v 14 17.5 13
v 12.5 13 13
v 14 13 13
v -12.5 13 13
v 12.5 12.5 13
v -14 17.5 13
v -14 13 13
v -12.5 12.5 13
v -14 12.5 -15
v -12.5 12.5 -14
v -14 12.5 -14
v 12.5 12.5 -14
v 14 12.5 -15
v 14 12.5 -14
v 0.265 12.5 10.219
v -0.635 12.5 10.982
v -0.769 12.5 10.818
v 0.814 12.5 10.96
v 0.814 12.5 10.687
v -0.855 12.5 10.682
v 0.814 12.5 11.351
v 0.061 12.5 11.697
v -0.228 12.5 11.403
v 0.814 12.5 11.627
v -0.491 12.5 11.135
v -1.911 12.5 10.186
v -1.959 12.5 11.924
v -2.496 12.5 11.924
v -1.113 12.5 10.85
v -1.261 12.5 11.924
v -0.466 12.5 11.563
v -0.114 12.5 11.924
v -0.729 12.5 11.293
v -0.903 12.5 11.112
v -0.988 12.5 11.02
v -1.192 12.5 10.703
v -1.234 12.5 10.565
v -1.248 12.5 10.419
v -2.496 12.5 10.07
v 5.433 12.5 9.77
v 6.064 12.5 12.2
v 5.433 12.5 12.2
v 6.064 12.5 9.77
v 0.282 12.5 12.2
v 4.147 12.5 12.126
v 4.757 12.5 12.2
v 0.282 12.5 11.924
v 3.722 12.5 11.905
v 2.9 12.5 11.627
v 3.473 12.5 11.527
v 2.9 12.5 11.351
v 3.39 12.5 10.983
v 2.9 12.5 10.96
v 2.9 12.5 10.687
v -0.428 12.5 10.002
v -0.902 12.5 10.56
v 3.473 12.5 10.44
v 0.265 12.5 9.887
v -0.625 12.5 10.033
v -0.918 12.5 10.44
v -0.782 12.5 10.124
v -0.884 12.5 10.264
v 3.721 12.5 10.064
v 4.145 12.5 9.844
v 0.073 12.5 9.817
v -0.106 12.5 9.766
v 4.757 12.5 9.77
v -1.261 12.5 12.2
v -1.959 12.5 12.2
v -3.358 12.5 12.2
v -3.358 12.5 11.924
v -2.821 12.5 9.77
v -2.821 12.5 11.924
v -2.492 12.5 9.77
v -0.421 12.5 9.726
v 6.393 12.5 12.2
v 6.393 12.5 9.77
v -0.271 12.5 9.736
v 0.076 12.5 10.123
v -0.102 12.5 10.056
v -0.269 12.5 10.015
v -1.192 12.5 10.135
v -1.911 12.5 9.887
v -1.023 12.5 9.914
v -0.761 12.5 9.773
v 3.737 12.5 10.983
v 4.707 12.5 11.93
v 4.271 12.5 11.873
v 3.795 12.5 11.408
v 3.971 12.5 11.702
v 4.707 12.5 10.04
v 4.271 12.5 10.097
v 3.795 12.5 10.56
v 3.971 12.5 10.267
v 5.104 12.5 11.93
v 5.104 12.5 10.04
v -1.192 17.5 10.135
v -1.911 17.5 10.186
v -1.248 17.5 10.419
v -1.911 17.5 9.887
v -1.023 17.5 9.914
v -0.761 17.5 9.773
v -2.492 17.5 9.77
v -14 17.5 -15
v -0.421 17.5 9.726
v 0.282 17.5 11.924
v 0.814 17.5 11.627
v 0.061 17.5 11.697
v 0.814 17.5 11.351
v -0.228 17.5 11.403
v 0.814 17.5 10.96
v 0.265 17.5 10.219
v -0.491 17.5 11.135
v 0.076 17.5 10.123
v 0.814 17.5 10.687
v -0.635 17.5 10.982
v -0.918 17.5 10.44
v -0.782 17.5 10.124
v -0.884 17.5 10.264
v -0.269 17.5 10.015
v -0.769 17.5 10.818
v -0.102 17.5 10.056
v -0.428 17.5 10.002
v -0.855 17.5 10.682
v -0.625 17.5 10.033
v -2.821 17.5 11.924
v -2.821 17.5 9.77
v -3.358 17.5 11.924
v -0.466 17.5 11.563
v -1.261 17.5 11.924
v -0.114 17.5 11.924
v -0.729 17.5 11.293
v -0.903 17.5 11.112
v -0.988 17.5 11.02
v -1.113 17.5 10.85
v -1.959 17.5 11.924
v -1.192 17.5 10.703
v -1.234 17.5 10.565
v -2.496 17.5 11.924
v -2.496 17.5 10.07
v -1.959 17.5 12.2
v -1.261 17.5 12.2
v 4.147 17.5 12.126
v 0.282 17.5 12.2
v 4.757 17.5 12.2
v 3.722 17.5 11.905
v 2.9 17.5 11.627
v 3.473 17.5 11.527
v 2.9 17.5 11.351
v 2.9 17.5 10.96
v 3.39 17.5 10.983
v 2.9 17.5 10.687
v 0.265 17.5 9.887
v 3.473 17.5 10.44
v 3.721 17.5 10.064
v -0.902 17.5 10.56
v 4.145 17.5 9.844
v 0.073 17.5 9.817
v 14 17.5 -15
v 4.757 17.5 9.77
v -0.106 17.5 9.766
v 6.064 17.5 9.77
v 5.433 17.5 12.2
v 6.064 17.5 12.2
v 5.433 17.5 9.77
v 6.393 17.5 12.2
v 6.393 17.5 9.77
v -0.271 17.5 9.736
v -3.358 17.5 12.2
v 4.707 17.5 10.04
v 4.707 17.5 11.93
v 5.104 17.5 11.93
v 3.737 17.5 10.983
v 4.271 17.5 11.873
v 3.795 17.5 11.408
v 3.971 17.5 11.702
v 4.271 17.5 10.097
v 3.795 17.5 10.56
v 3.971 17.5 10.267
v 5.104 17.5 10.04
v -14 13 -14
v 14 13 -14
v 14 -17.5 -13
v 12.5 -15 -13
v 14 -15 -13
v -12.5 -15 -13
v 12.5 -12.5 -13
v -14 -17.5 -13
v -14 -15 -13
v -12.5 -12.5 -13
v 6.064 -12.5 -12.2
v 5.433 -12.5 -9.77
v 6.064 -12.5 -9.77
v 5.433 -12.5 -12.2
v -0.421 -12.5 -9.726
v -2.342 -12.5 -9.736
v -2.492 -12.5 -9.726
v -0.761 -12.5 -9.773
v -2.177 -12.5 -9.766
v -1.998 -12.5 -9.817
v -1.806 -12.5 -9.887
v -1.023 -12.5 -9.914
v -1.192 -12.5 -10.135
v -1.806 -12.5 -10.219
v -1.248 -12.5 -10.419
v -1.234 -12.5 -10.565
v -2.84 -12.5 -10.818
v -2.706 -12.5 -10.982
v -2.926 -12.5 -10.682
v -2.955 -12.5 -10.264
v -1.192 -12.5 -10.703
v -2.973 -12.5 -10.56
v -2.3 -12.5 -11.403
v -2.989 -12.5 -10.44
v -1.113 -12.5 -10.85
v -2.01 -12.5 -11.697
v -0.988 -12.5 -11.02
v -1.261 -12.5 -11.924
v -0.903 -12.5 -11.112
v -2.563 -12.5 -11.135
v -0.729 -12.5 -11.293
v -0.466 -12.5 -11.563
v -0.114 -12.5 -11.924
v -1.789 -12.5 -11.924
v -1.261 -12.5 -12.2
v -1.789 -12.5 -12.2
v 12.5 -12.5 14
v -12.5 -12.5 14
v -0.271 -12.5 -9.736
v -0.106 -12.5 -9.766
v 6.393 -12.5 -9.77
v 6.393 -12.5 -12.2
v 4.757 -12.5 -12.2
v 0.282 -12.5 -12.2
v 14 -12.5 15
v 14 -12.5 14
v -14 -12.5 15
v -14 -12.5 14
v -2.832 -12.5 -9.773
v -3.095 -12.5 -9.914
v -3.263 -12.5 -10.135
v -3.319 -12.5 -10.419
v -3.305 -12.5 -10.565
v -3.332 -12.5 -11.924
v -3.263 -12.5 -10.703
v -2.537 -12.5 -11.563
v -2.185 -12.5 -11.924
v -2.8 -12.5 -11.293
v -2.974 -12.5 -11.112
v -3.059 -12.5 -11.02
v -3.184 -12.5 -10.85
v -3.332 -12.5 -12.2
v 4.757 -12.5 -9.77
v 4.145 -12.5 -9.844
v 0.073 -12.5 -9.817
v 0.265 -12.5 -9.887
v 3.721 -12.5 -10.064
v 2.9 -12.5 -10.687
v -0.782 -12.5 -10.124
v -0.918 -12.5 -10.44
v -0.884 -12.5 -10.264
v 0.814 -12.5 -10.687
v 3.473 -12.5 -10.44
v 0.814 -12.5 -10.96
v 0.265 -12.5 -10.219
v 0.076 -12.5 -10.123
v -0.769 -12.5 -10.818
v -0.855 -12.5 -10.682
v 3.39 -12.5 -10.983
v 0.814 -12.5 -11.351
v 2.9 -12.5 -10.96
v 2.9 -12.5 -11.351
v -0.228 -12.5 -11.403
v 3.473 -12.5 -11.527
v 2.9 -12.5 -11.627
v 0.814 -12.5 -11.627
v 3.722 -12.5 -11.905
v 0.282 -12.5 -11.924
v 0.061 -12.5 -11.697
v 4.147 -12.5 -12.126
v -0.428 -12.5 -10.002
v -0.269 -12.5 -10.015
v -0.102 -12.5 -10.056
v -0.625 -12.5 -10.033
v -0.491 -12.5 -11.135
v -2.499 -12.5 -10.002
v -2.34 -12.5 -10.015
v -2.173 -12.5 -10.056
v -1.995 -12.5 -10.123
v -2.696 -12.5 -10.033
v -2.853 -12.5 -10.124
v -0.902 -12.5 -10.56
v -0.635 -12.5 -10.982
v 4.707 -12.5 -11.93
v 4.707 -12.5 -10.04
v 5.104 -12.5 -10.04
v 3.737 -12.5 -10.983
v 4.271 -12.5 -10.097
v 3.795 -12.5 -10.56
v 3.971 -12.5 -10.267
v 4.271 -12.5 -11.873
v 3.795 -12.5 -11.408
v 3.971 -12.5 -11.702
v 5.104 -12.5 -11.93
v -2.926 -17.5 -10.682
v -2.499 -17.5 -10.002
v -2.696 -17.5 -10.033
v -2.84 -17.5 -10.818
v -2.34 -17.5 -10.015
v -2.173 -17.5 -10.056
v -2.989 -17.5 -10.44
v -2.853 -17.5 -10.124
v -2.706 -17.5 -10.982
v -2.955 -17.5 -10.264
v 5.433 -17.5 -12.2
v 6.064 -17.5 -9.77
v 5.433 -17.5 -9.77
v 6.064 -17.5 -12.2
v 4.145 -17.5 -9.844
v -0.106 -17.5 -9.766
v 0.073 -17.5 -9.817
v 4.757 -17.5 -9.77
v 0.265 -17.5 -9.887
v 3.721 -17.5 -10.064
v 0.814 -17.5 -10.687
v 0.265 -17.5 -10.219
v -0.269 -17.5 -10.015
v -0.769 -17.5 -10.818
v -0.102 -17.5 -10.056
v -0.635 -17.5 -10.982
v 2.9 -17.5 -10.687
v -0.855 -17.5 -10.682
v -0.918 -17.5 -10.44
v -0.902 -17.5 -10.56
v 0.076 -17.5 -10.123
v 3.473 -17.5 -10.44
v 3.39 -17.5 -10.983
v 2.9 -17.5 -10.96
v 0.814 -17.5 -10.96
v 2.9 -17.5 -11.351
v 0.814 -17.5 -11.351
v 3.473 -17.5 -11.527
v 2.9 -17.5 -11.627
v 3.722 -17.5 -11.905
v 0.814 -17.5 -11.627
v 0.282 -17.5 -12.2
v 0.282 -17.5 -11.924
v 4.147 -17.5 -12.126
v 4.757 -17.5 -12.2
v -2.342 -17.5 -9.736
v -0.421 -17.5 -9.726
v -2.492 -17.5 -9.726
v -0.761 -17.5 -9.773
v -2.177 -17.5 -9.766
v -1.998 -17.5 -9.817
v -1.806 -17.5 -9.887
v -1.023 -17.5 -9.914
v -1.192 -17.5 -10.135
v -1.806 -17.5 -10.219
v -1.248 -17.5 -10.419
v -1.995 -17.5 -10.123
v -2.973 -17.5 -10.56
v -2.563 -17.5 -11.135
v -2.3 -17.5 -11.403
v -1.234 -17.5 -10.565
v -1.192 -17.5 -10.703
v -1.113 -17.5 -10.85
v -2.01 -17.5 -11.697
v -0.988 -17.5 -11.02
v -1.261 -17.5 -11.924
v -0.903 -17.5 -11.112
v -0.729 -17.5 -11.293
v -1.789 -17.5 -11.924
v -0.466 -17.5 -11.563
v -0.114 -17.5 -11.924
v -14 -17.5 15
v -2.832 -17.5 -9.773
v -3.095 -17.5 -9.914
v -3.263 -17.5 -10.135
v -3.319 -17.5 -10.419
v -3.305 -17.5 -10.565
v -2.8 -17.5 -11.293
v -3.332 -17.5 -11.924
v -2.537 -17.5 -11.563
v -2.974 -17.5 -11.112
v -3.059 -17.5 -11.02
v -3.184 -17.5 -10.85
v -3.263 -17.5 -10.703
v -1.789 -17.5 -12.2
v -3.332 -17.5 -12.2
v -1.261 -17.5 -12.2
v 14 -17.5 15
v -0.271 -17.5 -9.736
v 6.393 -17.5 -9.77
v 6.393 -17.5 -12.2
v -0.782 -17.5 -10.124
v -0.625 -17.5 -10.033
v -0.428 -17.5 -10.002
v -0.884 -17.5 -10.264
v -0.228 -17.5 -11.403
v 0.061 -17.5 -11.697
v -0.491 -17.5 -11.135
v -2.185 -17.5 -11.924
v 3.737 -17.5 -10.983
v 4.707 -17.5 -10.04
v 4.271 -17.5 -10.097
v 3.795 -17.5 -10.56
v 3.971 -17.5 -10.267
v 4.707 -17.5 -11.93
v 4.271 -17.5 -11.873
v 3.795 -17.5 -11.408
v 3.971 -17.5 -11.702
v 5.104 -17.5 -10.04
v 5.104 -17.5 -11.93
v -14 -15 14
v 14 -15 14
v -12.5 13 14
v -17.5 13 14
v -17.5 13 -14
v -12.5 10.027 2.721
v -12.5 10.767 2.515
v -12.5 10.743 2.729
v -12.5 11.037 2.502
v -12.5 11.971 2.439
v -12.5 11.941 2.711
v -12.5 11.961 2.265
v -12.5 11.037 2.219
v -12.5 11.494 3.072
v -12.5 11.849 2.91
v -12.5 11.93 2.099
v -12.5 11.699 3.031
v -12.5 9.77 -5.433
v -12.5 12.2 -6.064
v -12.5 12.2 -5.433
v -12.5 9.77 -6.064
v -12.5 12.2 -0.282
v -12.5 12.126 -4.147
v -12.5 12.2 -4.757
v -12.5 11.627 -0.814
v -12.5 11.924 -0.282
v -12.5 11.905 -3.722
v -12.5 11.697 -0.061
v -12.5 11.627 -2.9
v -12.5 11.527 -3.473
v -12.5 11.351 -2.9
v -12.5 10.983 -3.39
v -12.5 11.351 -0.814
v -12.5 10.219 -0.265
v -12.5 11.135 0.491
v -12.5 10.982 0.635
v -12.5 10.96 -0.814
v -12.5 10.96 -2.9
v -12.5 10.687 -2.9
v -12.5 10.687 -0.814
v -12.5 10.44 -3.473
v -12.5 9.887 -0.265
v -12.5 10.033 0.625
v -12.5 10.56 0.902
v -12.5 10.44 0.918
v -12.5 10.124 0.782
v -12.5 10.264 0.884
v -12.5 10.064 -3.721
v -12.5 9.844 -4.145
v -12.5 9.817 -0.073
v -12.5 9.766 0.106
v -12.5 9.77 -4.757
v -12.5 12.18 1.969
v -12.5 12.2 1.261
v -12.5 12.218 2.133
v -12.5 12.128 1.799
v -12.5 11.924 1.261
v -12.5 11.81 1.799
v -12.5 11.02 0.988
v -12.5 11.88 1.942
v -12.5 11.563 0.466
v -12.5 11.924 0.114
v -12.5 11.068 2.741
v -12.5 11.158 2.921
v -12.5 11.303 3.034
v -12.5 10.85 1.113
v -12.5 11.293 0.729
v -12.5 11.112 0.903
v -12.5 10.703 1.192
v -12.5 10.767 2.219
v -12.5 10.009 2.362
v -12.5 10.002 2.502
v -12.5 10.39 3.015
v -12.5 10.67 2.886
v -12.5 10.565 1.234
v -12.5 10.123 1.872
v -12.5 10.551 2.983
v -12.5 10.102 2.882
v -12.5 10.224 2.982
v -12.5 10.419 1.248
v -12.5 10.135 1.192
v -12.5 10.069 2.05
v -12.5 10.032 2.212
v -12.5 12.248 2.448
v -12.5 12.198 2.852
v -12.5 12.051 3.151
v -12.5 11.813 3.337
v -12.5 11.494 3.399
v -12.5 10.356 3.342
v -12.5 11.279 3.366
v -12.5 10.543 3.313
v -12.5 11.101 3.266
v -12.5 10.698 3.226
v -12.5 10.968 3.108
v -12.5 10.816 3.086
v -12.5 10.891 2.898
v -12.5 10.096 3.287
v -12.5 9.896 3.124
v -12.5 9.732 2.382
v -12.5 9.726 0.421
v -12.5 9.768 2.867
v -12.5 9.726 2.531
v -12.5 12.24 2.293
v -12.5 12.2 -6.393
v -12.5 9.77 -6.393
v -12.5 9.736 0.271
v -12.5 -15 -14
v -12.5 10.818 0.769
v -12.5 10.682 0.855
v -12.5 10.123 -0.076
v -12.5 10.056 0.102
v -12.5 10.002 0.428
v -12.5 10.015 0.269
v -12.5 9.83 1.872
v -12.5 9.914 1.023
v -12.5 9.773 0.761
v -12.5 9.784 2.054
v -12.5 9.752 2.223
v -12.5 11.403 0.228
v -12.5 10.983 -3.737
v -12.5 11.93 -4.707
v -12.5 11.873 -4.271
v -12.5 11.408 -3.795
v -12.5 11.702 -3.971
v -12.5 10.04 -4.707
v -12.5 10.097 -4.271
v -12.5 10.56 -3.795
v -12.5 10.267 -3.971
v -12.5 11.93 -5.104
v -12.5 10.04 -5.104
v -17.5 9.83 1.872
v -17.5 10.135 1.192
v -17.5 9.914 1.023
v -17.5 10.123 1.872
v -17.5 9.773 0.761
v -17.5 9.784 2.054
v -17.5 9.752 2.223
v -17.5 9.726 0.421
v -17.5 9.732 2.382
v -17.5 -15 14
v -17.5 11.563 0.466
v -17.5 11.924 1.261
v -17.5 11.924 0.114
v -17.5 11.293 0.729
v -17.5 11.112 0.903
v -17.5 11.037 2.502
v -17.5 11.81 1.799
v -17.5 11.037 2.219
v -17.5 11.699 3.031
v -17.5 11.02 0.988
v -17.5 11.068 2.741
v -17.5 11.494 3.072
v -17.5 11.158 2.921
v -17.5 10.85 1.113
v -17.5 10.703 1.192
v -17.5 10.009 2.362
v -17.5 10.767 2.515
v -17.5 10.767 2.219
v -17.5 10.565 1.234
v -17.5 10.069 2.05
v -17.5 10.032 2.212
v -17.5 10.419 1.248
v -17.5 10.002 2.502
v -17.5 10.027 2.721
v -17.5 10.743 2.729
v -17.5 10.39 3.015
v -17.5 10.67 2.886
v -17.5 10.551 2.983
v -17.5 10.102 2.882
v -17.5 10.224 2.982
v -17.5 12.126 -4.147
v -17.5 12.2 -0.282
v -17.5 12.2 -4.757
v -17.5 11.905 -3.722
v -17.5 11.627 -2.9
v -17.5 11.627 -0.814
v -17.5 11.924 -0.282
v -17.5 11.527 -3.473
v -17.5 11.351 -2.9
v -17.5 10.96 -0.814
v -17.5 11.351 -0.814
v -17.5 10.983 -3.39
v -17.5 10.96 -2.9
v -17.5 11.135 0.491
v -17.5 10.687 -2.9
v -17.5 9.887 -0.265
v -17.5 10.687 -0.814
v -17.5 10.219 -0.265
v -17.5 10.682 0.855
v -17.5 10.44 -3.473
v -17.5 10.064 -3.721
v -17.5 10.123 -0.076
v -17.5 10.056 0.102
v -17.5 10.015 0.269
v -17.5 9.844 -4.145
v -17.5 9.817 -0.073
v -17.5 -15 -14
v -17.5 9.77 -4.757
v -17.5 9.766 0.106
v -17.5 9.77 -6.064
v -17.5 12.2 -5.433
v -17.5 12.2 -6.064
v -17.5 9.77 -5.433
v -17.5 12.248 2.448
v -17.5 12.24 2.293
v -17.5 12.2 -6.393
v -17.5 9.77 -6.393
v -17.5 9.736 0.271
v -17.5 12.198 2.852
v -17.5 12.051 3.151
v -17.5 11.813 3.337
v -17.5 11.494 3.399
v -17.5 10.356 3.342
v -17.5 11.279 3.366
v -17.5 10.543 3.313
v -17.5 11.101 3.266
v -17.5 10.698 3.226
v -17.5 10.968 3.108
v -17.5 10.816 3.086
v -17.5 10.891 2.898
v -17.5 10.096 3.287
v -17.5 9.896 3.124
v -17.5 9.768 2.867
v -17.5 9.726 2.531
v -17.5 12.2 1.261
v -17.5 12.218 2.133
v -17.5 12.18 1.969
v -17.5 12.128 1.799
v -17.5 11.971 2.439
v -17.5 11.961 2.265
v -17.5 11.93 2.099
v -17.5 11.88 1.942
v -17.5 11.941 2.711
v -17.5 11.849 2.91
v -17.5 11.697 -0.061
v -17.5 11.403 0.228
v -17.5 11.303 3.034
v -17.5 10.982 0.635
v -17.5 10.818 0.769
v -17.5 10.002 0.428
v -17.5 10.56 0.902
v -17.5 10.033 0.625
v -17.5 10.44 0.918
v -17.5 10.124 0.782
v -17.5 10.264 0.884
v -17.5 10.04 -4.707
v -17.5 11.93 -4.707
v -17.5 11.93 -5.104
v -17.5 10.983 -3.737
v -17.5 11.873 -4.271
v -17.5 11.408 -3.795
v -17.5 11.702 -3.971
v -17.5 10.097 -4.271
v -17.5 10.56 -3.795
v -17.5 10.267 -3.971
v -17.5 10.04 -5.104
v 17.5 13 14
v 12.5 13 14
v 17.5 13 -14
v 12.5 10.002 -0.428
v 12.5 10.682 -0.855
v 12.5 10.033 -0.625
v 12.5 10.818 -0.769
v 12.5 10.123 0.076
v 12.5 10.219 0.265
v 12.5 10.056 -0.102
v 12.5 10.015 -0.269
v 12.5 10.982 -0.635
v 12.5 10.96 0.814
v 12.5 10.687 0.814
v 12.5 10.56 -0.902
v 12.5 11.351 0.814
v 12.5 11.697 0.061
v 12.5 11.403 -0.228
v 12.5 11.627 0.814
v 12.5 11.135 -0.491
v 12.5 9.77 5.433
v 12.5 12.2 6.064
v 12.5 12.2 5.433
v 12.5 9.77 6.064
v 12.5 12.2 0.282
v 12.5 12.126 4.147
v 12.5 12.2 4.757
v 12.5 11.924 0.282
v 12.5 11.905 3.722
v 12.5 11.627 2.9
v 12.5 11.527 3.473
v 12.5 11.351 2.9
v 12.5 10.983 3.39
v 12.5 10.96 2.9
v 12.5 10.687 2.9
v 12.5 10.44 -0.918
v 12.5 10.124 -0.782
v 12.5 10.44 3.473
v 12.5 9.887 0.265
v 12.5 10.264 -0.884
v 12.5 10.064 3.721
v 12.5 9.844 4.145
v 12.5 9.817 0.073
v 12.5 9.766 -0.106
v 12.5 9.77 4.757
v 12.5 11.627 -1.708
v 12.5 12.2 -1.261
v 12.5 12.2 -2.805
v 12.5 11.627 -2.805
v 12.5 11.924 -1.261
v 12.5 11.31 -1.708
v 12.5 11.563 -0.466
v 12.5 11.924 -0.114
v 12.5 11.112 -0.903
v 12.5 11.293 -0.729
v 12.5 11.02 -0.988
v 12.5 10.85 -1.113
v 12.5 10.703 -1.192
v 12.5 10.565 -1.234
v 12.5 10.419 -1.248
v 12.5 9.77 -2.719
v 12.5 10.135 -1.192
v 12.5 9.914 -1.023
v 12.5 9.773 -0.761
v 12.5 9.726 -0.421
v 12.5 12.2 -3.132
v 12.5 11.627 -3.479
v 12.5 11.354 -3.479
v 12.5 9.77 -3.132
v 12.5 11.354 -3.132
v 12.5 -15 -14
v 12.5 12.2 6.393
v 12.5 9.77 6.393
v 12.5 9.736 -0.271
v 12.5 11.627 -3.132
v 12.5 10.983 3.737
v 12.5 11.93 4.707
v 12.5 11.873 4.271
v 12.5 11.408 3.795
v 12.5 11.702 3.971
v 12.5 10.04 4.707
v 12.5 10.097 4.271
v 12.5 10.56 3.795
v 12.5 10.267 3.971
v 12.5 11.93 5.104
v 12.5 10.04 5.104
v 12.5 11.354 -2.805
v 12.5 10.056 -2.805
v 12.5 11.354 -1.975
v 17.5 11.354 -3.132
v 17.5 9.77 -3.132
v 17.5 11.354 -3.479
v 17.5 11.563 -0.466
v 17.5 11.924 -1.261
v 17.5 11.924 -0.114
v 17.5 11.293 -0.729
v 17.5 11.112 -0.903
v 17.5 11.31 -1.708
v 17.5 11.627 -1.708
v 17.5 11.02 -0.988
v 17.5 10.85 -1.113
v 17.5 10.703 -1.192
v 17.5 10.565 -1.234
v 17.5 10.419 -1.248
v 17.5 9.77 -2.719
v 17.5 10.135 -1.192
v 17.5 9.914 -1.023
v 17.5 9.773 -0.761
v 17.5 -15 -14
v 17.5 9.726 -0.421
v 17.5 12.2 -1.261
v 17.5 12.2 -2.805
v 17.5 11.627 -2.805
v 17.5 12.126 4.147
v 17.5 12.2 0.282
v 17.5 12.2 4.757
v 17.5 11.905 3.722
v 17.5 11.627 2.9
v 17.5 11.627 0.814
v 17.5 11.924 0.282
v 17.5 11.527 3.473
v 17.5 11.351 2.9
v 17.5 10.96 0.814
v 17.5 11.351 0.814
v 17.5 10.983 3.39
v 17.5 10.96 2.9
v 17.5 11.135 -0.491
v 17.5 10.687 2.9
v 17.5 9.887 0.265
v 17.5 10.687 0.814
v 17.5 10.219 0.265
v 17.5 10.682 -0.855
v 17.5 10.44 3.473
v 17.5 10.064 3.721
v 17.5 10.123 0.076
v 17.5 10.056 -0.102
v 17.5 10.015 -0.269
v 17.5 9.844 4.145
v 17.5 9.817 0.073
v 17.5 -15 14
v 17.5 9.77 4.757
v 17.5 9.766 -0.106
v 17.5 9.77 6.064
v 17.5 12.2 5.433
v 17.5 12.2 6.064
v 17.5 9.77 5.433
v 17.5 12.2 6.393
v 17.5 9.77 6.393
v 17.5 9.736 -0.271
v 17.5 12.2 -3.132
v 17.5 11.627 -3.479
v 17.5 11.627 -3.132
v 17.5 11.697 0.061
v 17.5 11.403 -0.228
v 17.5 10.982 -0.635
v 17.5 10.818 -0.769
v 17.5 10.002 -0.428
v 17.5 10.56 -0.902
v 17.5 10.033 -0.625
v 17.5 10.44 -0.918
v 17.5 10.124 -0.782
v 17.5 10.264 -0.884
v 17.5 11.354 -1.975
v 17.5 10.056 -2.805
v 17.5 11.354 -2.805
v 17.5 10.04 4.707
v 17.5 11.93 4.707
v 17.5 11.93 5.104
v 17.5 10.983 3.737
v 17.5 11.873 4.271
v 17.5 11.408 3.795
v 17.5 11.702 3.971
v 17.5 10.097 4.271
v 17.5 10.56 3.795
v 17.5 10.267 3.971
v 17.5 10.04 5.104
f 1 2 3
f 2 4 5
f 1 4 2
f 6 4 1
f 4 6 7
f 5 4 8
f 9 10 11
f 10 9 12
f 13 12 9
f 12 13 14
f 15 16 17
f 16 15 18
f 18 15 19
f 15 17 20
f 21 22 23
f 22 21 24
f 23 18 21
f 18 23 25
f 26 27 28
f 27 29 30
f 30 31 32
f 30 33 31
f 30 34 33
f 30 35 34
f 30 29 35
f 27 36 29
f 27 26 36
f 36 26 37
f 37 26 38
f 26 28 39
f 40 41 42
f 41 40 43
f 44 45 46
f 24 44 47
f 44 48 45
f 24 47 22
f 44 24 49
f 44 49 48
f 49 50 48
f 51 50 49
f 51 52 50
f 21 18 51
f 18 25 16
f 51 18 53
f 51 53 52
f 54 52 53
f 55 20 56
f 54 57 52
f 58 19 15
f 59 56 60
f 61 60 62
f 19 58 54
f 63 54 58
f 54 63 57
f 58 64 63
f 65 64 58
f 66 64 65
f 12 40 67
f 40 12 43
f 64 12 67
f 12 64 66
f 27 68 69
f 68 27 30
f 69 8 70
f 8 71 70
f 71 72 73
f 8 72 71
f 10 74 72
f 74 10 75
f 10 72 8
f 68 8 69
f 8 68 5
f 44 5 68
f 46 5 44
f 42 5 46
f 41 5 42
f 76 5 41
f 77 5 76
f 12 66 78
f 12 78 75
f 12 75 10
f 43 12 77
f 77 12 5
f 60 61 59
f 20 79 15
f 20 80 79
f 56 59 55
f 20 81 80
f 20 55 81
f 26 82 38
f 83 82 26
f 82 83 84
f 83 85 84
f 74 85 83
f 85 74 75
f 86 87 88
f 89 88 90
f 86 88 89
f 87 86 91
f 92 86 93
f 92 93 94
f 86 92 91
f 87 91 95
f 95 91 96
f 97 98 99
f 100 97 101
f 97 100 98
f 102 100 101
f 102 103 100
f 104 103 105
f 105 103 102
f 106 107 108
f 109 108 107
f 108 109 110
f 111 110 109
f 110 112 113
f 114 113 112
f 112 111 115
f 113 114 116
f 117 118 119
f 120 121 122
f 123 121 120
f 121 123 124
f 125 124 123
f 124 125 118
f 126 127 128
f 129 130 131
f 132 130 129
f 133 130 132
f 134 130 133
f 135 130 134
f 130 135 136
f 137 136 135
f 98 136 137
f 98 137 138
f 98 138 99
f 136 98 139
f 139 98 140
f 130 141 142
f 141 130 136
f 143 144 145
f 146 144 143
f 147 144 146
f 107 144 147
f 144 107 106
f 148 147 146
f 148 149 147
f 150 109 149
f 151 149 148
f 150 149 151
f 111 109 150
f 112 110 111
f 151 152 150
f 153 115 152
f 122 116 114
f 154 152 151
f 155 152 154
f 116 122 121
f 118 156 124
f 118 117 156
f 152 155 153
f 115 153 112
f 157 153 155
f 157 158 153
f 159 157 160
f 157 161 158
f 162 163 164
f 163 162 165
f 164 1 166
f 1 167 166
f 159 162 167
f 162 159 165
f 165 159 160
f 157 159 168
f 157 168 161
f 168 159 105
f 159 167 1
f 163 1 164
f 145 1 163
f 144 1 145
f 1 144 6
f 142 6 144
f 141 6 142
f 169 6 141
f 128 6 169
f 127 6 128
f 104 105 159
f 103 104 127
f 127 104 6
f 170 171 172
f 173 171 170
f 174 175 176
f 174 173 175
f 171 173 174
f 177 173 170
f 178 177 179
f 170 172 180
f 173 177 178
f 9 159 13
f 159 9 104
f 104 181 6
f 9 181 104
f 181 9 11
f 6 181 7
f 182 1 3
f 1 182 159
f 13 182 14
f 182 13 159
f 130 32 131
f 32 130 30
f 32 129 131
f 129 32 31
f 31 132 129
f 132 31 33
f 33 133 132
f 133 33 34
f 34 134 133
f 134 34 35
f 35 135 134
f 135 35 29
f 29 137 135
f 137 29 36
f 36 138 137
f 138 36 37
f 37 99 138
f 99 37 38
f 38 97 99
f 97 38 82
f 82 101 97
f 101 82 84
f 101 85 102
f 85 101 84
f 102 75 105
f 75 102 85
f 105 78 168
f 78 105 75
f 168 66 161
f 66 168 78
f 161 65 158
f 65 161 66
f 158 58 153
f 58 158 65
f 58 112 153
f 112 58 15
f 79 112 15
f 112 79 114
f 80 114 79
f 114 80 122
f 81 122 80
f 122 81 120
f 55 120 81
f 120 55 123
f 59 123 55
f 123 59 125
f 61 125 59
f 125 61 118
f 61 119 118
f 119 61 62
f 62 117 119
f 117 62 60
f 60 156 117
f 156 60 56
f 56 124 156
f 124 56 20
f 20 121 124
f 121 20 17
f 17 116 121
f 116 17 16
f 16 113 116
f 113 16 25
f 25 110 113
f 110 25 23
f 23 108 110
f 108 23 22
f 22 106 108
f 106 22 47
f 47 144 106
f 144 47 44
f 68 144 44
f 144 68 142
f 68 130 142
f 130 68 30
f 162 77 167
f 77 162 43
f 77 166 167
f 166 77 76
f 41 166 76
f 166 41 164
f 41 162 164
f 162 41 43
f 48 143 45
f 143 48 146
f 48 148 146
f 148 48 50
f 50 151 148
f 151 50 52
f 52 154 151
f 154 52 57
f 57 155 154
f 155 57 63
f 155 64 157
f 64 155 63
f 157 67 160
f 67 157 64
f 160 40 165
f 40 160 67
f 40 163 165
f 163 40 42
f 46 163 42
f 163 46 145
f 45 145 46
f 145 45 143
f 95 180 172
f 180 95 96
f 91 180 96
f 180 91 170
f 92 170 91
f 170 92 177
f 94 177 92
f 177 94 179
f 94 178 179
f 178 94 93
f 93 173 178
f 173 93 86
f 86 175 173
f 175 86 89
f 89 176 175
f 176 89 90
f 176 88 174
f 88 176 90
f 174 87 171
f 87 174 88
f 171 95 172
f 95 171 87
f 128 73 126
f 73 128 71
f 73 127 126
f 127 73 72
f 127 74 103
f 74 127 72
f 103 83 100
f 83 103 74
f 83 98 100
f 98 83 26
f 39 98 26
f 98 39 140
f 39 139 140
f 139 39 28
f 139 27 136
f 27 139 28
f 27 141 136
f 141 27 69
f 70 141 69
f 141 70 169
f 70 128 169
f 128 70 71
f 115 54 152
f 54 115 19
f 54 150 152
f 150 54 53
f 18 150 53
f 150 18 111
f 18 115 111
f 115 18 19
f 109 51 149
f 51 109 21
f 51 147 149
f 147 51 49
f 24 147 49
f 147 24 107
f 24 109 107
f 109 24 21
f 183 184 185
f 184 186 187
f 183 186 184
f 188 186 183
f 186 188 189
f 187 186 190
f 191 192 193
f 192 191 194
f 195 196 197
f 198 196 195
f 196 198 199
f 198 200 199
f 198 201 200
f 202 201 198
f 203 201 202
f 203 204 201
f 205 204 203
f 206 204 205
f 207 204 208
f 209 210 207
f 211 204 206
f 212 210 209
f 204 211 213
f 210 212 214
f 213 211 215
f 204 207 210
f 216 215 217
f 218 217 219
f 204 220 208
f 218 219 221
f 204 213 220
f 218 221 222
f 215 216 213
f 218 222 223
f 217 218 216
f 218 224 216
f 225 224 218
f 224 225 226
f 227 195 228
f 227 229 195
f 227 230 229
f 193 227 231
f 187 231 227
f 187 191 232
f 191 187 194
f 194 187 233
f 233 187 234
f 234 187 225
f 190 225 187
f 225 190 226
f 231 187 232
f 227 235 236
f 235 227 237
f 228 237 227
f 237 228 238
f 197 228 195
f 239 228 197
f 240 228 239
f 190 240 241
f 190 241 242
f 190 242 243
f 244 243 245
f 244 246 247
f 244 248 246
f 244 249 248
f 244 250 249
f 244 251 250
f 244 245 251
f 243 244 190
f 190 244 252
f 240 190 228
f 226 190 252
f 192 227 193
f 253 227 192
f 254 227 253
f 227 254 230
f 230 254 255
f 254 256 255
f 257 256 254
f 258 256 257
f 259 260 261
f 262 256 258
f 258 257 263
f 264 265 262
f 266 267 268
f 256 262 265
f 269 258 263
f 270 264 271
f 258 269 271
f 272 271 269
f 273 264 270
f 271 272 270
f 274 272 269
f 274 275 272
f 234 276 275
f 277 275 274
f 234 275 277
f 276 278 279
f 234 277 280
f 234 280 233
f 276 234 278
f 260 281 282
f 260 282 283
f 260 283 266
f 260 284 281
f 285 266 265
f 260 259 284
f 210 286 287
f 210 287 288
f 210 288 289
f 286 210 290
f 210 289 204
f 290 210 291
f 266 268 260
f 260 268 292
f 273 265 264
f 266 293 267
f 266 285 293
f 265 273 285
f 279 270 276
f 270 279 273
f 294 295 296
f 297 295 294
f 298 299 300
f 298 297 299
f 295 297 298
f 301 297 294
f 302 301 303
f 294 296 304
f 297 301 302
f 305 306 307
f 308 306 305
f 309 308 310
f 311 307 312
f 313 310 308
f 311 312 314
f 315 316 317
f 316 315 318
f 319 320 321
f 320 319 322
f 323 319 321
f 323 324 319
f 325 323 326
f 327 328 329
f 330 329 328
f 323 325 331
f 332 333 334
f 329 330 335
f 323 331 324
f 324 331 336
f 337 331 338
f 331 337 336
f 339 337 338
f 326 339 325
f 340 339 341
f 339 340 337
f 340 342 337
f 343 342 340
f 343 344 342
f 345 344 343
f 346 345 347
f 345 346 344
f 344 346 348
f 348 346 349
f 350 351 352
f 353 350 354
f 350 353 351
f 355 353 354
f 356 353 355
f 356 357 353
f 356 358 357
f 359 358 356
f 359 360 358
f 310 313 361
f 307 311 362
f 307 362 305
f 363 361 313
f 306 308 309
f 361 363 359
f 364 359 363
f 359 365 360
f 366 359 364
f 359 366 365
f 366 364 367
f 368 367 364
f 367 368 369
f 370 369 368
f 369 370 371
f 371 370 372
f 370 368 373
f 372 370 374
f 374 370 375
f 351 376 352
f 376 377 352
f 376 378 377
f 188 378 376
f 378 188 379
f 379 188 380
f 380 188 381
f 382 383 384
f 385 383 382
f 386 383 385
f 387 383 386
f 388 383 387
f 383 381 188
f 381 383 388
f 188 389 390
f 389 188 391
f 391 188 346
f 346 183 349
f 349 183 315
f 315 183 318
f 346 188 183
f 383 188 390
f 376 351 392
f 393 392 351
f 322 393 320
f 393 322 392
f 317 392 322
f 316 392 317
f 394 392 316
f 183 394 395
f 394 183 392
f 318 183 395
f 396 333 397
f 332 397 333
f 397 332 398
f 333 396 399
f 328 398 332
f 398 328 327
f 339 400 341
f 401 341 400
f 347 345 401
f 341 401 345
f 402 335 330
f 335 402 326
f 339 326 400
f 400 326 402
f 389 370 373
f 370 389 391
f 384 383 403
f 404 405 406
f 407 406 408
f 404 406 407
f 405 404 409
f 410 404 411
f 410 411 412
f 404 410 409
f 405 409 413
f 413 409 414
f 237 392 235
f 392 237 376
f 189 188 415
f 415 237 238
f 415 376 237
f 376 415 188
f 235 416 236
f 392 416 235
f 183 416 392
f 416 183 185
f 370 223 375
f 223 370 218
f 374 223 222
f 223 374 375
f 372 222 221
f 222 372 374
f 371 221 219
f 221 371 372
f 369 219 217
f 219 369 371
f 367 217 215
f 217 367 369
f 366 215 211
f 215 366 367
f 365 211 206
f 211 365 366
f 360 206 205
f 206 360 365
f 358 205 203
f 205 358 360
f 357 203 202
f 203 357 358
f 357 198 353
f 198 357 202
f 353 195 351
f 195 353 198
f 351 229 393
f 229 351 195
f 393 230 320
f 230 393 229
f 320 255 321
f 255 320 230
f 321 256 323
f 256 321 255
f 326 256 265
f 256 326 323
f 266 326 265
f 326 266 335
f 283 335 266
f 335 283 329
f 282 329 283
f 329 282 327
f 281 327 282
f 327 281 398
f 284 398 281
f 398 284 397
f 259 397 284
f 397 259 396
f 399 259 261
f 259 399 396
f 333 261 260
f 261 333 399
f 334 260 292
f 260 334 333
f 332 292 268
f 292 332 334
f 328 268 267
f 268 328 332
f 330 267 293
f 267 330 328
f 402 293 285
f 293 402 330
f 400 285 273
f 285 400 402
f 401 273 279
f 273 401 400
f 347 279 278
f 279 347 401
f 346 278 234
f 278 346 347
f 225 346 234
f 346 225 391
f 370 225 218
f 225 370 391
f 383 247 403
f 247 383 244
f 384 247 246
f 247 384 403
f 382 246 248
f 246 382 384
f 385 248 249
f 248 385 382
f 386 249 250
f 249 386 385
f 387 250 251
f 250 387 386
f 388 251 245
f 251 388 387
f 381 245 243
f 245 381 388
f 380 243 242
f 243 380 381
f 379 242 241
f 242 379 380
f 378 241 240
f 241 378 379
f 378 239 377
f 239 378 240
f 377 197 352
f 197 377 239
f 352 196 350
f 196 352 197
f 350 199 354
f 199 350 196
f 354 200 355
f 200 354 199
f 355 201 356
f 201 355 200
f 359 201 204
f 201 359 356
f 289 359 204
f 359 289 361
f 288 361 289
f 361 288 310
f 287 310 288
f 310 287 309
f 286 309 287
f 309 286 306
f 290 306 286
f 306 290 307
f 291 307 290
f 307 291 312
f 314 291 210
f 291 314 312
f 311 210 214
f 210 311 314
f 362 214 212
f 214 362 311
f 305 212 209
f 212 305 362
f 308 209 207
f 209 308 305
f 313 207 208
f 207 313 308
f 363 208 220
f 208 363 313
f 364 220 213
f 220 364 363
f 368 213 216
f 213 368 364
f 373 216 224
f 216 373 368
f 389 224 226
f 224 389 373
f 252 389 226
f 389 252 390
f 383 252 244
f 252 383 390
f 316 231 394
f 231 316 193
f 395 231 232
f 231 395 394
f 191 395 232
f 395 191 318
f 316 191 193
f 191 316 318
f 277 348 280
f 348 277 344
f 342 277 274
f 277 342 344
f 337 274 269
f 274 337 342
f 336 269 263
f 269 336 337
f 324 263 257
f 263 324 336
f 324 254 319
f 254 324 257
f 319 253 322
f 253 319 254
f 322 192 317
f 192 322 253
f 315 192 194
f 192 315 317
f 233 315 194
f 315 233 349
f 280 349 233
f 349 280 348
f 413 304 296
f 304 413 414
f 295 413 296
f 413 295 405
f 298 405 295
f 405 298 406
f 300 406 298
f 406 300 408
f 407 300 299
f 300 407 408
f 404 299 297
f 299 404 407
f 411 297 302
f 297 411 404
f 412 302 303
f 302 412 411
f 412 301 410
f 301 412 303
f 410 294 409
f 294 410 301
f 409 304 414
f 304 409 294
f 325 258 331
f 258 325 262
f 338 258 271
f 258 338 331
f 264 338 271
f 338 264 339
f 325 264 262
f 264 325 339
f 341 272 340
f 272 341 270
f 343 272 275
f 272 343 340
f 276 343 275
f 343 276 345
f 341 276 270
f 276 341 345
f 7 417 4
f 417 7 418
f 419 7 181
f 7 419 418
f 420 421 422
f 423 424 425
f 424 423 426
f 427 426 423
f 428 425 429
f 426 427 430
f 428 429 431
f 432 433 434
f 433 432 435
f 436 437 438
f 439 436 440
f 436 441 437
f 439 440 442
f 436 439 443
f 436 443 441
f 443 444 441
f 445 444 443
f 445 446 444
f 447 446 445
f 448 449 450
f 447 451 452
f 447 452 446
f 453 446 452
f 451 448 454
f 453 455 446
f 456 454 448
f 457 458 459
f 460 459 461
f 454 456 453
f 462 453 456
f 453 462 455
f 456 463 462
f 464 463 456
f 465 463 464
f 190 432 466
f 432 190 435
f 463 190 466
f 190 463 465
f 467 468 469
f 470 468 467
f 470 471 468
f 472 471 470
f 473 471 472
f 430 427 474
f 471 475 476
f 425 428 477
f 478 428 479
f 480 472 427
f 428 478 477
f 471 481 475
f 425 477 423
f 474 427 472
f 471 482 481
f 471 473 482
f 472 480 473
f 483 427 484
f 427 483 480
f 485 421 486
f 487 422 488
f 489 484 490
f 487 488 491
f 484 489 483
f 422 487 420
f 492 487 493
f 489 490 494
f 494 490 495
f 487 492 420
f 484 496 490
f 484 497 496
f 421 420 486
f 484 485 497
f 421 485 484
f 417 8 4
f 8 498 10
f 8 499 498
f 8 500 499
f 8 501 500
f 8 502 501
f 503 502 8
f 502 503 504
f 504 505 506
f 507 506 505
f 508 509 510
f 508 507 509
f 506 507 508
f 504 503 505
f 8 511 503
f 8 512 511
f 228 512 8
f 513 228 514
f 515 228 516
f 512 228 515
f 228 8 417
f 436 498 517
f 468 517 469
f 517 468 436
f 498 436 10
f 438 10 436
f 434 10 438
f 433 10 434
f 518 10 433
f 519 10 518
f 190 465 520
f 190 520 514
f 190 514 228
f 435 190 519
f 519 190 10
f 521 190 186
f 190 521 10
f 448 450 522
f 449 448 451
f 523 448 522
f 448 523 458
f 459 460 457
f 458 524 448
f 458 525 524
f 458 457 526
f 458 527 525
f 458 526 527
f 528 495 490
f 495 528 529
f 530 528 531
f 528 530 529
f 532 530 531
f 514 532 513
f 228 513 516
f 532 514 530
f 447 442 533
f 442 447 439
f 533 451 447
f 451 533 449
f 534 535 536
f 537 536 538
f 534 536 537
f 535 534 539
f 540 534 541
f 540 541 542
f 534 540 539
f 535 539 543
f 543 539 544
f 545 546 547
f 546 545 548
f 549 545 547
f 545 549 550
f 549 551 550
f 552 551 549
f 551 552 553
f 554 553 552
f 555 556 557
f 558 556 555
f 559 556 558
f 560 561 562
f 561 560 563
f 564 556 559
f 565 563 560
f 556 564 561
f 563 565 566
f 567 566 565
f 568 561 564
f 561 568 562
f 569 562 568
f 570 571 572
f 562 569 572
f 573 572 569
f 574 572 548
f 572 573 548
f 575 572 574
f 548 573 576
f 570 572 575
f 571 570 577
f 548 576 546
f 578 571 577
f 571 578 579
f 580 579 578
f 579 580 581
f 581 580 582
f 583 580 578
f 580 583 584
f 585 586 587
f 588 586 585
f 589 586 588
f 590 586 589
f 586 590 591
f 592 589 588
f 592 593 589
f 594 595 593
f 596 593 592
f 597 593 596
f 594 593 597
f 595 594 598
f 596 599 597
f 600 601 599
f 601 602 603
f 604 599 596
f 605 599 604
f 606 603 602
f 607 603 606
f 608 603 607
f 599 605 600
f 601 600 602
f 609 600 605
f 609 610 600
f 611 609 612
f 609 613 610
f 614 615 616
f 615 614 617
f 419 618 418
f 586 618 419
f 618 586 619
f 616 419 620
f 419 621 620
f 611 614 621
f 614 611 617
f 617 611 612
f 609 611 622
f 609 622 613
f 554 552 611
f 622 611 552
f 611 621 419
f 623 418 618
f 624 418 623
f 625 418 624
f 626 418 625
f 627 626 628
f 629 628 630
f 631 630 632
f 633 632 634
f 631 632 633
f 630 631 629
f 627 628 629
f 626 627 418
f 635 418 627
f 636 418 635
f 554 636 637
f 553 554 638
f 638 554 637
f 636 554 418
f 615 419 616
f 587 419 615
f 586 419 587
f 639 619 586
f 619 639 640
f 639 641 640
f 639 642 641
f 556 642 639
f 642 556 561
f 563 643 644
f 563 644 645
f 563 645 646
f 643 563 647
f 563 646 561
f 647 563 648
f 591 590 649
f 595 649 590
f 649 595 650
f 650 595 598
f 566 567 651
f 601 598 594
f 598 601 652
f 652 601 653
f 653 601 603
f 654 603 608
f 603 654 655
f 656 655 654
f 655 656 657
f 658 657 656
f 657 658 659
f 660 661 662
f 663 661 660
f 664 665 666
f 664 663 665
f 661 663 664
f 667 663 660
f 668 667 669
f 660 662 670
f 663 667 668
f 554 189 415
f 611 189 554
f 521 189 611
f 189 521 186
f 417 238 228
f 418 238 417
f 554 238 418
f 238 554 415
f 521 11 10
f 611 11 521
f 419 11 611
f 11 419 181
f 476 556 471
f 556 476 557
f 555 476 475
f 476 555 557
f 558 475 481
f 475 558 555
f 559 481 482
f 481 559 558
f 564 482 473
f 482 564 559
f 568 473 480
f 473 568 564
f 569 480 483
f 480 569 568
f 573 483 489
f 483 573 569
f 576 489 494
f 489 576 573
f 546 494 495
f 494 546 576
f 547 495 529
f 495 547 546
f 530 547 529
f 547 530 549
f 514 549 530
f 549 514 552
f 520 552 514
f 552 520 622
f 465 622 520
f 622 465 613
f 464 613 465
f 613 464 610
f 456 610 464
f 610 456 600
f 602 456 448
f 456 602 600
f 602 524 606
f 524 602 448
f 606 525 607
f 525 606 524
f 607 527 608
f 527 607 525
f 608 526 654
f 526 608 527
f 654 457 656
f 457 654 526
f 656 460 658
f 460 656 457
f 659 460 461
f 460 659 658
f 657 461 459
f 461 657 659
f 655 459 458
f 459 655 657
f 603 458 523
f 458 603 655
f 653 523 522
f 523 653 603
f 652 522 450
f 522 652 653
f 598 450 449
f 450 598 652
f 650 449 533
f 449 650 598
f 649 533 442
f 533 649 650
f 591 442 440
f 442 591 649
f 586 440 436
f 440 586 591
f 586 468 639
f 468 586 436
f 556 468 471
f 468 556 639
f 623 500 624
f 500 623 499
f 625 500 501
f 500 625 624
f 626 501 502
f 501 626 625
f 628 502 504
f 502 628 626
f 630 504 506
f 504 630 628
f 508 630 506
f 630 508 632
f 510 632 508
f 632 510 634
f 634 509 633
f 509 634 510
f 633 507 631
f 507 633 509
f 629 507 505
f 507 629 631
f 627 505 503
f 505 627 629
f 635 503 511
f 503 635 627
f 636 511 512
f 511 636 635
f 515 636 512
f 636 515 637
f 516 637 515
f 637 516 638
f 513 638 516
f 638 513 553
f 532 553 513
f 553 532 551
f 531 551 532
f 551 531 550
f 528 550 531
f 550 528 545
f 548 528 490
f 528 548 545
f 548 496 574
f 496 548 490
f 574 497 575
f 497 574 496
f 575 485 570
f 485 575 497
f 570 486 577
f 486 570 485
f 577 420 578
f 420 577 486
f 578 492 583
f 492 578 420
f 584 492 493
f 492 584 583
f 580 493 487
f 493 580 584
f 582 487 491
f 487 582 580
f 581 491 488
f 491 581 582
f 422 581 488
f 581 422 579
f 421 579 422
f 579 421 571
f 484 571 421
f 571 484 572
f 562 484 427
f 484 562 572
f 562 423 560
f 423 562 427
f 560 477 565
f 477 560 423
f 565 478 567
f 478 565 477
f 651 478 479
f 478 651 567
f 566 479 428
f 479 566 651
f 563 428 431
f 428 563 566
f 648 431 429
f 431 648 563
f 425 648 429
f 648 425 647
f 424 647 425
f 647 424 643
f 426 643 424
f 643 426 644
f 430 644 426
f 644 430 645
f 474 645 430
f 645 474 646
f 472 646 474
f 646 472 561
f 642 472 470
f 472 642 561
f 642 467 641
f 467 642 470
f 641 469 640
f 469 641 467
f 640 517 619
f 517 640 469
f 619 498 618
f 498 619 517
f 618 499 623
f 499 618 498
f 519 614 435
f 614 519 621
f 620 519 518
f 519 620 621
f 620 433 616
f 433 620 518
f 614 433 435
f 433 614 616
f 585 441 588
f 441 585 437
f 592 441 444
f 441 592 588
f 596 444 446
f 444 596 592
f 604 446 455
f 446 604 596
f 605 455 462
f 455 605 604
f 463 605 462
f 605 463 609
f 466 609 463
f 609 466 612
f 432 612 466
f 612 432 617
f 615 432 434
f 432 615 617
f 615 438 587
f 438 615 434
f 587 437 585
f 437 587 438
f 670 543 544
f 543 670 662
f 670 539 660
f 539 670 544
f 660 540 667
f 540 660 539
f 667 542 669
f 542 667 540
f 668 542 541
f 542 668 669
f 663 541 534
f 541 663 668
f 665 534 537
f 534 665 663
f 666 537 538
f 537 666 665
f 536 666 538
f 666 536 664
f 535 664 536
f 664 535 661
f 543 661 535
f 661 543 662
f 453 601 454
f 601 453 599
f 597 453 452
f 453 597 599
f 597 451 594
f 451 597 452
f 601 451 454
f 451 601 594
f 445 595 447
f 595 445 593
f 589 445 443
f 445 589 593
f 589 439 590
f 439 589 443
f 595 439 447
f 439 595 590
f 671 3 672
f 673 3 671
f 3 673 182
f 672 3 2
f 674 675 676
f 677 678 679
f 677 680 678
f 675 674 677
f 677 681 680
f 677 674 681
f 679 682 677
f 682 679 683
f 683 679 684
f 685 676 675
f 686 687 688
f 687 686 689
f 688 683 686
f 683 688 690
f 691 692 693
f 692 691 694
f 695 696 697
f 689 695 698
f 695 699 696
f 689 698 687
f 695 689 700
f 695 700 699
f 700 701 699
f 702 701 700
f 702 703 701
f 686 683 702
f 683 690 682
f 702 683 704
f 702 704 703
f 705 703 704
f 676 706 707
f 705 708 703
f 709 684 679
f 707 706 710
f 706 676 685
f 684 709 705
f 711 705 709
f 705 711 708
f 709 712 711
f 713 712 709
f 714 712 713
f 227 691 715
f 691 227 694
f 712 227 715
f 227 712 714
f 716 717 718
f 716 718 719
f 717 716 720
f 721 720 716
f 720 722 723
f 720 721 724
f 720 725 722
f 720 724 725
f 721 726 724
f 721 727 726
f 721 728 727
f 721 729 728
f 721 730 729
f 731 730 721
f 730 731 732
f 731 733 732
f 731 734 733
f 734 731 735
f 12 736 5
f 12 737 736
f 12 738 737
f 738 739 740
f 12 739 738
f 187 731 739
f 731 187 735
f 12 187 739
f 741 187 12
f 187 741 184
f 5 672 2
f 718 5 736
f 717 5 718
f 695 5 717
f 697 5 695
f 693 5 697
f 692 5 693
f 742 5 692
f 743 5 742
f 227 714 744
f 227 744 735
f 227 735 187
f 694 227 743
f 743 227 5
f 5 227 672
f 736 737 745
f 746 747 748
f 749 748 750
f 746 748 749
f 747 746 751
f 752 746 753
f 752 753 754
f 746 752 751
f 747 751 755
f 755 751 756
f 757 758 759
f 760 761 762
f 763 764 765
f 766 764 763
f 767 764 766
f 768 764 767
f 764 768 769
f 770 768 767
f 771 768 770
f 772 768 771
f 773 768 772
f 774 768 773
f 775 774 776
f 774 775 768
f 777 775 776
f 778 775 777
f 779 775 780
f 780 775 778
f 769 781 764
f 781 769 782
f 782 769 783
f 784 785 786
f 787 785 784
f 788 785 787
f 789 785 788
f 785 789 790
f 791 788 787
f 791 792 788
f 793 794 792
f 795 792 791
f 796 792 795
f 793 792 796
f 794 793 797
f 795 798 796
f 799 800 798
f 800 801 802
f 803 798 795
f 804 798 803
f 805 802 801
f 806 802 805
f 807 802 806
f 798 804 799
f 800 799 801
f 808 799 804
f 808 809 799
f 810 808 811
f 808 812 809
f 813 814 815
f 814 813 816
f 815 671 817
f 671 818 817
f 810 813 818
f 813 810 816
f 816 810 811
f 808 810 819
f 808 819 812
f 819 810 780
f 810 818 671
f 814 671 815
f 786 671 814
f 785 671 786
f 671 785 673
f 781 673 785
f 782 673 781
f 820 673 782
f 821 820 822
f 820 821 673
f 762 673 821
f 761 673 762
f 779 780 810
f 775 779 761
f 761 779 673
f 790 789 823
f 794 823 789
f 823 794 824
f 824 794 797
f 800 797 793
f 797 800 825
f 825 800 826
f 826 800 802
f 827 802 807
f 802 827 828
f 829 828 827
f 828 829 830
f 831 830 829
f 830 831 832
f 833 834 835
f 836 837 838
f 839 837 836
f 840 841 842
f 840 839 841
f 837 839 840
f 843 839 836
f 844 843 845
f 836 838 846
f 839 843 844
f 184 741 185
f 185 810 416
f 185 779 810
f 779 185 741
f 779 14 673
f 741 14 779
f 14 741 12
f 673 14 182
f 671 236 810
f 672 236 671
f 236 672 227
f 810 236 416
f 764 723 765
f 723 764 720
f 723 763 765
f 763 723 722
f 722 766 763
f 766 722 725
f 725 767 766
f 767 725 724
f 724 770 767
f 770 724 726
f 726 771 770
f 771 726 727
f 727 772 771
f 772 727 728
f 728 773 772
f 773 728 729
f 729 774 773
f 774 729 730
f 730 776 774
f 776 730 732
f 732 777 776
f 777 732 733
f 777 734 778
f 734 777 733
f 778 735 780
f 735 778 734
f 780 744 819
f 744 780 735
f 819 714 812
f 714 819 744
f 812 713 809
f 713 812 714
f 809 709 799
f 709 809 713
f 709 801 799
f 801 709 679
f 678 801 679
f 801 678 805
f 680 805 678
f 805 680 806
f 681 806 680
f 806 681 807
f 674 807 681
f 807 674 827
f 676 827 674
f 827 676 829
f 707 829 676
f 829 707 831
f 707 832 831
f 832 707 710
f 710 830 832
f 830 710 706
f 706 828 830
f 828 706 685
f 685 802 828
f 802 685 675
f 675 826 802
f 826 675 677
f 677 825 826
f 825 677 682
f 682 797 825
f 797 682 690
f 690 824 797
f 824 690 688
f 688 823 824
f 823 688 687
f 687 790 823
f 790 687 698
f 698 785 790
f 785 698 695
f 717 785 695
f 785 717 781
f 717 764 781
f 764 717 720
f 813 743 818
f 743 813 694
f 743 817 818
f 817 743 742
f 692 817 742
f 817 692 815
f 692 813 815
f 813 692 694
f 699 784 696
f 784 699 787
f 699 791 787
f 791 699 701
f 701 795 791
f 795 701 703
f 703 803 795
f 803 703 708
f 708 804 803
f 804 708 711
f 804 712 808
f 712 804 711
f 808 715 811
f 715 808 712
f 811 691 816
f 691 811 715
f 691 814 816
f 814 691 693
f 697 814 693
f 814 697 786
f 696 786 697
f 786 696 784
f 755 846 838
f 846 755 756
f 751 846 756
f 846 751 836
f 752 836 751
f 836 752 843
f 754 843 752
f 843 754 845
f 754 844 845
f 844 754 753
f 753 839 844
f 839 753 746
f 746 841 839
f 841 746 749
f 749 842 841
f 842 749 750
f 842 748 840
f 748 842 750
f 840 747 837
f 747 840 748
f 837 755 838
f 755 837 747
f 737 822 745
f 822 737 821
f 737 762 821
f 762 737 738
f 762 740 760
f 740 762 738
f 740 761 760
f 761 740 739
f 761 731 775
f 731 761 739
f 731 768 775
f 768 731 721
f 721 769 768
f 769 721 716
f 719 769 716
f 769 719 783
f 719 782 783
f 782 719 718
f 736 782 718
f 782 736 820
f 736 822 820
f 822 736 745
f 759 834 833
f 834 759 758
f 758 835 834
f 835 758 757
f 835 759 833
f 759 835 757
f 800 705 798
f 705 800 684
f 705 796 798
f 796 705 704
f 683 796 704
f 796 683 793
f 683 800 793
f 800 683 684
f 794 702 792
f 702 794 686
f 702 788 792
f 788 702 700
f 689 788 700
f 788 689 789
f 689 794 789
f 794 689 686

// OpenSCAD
// file: modules.scad
zoom = [0.8,0.8,1];

module white( filename, text)
{
    scale(zoom)
    rotate([0,0,90]) 
    union(){ 
        translate([21.5,-8.4,-2.5])   rotate([0,0,90])  linear_extrude(5)  text (text,font="bold",size=3); 
        intersection() 
        {    
            cube([35,35,5],center=true); 
            translate([3,0,2.6])    scale([0.14,0.14,-1])  
            surface(file = filename, center = true); 
        } 
    } 

};

module black( filename, text)
{
    scale(zoom)
    rotate([0,0,90]) 
    difference() 
    {    
        translate([5,0,0])  cube([35,35,5],center=true); 
        translate([3,0,2.6])    scale([0.14,0.14,-1])  
        surface(file = filename, center = true);
        translate([21.5,-8.4,-2.5])   rotate([0,0,90])  linear_extrude(6)  text (text,font="bold",size=3);
    } 
}

module shape()
{
    scale(zoom)   rotate([0,0,90]) translate([5,0,0])  cube([35,35,5],center=true);  
}
// main file
include <modules.scad>

union() color([0,1,0])
{    
    rotate([90,0,0])    translate([0,-5,-15])   black("../aruco/Marker21.png","ID=21");  
    rotate([-90,0,0])    translate([0,-5,-15])  black("../aruco/Marker22.png","ID=22");  
    rotate([00,90,0])    translate([0,-5,-15])  black("../aruco/Marker23.png","ID=23");  
    rotate([00,-90,0])    translate([0,-5,-15]) black("../aruco/Marker24.png","ID=24");  

}
